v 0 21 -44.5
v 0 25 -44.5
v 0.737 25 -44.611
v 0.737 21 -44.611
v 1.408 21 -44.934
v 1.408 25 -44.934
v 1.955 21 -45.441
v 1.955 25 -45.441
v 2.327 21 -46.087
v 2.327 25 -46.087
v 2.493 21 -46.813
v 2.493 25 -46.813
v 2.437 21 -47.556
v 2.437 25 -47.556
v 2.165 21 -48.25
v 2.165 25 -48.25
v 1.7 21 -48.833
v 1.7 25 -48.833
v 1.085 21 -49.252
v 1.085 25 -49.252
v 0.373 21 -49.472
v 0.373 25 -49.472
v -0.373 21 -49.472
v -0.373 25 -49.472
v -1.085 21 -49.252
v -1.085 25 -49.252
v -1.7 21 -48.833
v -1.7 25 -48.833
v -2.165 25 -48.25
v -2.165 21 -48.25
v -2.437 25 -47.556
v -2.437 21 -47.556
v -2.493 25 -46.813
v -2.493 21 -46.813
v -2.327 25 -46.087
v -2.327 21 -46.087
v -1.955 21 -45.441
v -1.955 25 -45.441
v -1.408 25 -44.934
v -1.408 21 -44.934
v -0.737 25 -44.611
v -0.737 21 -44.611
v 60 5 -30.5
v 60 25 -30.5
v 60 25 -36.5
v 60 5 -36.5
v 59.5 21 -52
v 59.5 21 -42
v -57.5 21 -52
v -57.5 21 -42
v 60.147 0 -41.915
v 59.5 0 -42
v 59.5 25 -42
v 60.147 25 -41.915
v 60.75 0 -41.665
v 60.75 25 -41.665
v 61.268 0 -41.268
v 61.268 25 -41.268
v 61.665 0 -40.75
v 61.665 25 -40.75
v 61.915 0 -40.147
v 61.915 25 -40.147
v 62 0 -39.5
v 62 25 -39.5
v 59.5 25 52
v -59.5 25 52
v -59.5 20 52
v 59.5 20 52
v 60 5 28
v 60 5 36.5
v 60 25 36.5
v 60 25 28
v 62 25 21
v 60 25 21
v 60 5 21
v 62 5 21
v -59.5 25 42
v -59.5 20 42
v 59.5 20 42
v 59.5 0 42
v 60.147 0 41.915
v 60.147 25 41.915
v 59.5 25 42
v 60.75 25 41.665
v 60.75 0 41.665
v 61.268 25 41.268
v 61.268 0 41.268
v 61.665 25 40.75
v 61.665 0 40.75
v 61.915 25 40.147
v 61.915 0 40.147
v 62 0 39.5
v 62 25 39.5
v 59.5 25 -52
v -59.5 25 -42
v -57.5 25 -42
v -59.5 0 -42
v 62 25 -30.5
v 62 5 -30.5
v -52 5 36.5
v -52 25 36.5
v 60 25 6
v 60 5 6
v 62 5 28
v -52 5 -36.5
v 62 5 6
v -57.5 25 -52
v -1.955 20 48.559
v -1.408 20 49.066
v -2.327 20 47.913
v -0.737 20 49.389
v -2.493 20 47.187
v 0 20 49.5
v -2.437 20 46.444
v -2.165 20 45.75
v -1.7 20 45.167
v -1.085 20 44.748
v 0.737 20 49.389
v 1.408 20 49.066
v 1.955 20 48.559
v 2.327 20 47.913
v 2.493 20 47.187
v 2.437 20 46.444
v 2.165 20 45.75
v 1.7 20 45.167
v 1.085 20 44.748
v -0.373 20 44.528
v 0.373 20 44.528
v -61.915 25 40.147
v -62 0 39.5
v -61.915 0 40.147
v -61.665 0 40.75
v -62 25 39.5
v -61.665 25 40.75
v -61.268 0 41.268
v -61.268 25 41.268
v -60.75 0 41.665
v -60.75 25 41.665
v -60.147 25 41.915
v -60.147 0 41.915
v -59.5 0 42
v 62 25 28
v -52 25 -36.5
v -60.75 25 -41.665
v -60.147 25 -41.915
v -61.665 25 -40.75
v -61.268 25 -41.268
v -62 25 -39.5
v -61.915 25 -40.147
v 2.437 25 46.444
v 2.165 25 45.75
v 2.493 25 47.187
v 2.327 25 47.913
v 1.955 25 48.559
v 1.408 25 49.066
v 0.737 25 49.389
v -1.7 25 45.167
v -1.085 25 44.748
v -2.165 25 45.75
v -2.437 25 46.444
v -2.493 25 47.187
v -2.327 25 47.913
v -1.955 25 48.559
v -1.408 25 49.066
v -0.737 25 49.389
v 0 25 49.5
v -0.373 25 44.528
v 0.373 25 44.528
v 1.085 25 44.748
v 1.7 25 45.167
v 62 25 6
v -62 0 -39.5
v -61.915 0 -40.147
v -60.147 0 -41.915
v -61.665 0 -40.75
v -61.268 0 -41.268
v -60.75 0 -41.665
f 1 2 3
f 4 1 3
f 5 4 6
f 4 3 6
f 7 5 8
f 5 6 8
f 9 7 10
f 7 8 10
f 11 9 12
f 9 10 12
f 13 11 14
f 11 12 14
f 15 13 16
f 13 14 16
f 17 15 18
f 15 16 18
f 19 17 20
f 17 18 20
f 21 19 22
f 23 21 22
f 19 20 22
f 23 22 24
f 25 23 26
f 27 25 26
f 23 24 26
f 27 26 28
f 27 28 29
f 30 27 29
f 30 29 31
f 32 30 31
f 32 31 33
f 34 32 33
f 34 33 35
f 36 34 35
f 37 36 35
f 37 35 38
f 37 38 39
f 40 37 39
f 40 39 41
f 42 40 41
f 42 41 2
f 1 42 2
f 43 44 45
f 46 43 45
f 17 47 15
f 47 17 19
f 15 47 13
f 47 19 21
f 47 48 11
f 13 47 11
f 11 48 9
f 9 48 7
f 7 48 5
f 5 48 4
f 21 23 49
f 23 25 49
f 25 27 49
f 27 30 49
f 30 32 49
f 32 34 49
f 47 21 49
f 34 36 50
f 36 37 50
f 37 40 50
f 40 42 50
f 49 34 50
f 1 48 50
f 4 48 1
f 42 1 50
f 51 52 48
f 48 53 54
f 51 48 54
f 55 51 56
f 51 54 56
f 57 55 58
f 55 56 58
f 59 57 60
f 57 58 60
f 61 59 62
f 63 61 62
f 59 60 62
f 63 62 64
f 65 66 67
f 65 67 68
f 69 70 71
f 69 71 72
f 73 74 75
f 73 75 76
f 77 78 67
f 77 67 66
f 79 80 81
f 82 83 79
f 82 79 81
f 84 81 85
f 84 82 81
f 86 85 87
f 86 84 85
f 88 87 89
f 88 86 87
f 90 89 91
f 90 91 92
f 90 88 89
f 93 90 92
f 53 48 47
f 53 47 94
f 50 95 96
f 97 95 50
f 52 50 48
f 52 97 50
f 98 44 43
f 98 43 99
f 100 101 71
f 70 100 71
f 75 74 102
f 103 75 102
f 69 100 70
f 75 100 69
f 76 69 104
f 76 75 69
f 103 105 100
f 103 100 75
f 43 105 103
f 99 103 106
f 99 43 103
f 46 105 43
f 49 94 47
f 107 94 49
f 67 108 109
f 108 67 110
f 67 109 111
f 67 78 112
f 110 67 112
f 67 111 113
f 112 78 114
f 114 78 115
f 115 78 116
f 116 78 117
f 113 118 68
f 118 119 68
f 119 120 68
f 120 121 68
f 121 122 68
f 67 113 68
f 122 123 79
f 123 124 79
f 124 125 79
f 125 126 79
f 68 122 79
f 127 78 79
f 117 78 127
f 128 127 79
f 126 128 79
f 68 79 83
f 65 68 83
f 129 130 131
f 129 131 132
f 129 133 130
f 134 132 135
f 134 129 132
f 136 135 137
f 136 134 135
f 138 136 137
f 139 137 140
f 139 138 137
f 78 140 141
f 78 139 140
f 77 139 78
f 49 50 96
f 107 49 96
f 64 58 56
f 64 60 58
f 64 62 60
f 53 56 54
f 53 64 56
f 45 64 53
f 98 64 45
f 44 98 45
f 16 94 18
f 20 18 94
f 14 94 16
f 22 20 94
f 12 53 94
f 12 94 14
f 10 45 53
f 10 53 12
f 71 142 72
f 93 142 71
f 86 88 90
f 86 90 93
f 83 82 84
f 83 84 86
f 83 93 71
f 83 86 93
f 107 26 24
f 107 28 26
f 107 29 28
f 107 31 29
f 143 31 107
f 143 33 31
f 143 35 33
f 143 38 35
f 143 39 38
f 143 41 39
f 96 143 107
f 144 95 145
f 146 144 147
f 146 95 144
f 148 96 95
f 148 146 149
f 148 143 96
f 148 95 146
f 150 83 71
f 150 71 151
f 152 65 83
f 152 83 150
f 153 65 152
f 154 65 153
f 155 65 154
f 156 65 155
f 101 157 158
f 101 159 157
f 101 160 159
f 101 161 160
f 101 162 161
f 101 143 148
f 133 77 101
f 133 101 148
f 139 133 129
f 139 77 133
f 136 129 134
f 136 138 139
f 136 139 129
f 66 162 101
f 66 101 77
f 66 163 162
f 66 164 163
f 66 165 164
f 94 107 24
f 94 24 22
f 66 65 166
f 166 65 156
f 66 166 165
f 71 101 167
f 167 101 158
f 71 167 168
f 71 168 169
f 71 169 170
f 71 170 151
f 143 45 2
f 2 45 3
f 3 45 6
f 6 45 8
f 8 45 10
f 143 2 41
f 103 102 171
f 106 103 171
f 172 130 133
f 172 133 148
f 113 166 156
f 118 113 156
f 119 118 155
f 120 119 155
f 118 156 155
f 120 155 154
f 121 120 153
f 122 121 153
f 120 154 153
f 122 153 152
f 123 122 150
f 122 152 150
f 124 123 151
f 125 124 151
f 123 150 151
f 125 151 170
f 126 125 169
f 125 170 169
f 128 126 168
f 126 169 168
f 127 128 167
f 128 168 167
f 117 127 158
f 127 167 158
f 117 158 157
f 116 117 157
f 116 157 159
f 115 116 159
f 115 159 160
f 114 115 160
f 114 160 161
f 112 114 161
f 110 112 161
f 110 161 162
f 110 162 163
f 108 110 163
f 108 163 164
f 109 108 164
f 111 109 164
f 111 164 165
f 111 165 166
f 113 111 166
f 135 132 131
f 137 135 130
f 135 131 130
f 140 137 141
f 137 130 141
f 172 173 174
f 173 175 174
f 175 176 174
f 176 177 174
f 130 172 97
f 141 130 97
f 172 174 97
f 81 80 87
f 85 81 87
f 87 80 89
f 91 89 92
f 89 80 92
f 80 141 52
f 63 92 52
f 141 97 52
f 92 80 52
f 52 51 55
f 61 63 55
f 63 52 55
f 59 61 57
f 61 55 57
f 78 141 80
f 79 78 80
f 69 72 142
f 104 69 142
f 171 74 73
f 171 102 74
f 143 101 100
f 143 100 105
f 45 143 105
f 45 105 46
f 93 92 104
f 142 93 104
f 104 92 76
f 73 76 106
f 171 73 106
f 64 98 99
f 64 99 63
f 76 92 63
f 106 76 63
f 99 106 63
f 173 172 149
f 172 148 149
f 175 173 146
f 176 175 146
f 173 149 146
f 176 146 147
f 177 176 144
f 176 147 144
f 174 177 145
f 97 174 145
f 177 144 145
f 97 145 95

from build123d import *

# Parameters (mm, degrees)
SKETCH1_W           = 124
SKETCH1_H           = 84
BOSS_EXTRUDE1_DEPTH = 25
SKETCH2_W           = 112
SKETCH2_H           = 73
CUT_EXTRUDE1_DEPTH  = 20
SKETCH4_W           = 2
SKETCH4_H           = 7
SKETCH4_H_2         = 36.5
CUT_EXTRUDE2_DEPTH  = 20
FILLET1_R           = 2.5
SKETCH5_W           = 119
SKETCH5_H           = 5
BOSS_EXTRUDE2_DEPTH = 10
SKETCH6_W           = 117
SKETCH6_H           = 4
BOSS_EXTRUDE3_DEPTH = 10
SKETCH7_R           = 2.5
CUT_EXTRUDE3_DEPTH  = 85.693565281


with BuildPart() as part:
    # Sketch1 → Boss-Extrude1 (new body)
    with BuildSketch(Plane(origin=(0, 0, 0), x_dir=(1, 0, 0), z_dir=(0, 1, 0))):
        Rectangle(SKETCH1_W, SKETCH1_H)
    extrude(amount=BOSS_EXTRUDE1_DEPTH)

    # Sketch2 → Cut-Extrude1 (cut)
    with BuildSketch(Plane(origin=(0, 25, 0), x_dir=(1, 0, 0), z_dir=(0, 1, 0))):
        with Locations((4, 0)):
            Rectangle(SKETCH2_W, SKETCH2_H)
    extrude(amount=-CUT_EXTRUDE1_DEPTH, mode=Mode.SUBTRACT)

    # Sketch4 → Cut-Extrude2 (cut)
    with BuildSketch(Plane(origin=(0, 25, 0), x_dir=(1, 0, 0), z_dir=(0, 1, 0))):
        with Locations((61, -24.5)):
            Rectangle(SKETCH4_W, SKETCH4_H)
        with Locations((61, 12.25)):
            Rectangle(SKETCH4_W, SKETCH4_H_2)
    extrude(amount=-CUT_EXTRUDE2_DEPTH, mode=Mode.SUBTRACT)

    # Fillet1
    fillet1_edges = [part.edges().sort_by_distance(p)[0] for p in [
        (62, 12.5, 42),
        (-62, 12.5, 42),
        (-62, 12.5, -42),
        (62, 12.5, -42),
    ]]
    fillet(fillet1_edges, radius=FILLET1_R)

    # Sketch5 → Boss-Extrude2 (add)
    with BuildSketch(Plane.XY.offset(42)):
        with Locations((0, 22.5)):
            Rectangle(SKETCH5_W, SKETCH5_H)
    extrude(amount=BOSS_EXTRUDE2_DEPTH)

    # Sketch6 → Boss-Extrude3 (add)
    with BuildSketch(Plane(origin=(0, 0, -42), x_dir=(-1, 0, 0), z_dir=(0, 0, -1))):
        with Locations((-1, 23)):
            Rectangle(SKETCH6_W, SKETCH6_H)
    extrude(amount=BOSS_EXTRUDE3_DEPTH)

    # Sketch7 → Cut-Extrude3 (cut, through all)
    with BuildSketch(Plane(origin=(0, 25, 0), x_dir=(1, 0, 0), z_dir=(0, 1, 0))):
        with Locations(Location((0, 47, 0), (0, 0, 270))):
            Circle(SKETCH7_R)
        with Locations(Location((0, -47, 0), (0, 0, 270))):
            Circle(SKETCH7_R)
    extrude(amount=-CUT_EXTRUDE3_DEPTH, mode=Mode.SUBTRACT)


solid = part.part
